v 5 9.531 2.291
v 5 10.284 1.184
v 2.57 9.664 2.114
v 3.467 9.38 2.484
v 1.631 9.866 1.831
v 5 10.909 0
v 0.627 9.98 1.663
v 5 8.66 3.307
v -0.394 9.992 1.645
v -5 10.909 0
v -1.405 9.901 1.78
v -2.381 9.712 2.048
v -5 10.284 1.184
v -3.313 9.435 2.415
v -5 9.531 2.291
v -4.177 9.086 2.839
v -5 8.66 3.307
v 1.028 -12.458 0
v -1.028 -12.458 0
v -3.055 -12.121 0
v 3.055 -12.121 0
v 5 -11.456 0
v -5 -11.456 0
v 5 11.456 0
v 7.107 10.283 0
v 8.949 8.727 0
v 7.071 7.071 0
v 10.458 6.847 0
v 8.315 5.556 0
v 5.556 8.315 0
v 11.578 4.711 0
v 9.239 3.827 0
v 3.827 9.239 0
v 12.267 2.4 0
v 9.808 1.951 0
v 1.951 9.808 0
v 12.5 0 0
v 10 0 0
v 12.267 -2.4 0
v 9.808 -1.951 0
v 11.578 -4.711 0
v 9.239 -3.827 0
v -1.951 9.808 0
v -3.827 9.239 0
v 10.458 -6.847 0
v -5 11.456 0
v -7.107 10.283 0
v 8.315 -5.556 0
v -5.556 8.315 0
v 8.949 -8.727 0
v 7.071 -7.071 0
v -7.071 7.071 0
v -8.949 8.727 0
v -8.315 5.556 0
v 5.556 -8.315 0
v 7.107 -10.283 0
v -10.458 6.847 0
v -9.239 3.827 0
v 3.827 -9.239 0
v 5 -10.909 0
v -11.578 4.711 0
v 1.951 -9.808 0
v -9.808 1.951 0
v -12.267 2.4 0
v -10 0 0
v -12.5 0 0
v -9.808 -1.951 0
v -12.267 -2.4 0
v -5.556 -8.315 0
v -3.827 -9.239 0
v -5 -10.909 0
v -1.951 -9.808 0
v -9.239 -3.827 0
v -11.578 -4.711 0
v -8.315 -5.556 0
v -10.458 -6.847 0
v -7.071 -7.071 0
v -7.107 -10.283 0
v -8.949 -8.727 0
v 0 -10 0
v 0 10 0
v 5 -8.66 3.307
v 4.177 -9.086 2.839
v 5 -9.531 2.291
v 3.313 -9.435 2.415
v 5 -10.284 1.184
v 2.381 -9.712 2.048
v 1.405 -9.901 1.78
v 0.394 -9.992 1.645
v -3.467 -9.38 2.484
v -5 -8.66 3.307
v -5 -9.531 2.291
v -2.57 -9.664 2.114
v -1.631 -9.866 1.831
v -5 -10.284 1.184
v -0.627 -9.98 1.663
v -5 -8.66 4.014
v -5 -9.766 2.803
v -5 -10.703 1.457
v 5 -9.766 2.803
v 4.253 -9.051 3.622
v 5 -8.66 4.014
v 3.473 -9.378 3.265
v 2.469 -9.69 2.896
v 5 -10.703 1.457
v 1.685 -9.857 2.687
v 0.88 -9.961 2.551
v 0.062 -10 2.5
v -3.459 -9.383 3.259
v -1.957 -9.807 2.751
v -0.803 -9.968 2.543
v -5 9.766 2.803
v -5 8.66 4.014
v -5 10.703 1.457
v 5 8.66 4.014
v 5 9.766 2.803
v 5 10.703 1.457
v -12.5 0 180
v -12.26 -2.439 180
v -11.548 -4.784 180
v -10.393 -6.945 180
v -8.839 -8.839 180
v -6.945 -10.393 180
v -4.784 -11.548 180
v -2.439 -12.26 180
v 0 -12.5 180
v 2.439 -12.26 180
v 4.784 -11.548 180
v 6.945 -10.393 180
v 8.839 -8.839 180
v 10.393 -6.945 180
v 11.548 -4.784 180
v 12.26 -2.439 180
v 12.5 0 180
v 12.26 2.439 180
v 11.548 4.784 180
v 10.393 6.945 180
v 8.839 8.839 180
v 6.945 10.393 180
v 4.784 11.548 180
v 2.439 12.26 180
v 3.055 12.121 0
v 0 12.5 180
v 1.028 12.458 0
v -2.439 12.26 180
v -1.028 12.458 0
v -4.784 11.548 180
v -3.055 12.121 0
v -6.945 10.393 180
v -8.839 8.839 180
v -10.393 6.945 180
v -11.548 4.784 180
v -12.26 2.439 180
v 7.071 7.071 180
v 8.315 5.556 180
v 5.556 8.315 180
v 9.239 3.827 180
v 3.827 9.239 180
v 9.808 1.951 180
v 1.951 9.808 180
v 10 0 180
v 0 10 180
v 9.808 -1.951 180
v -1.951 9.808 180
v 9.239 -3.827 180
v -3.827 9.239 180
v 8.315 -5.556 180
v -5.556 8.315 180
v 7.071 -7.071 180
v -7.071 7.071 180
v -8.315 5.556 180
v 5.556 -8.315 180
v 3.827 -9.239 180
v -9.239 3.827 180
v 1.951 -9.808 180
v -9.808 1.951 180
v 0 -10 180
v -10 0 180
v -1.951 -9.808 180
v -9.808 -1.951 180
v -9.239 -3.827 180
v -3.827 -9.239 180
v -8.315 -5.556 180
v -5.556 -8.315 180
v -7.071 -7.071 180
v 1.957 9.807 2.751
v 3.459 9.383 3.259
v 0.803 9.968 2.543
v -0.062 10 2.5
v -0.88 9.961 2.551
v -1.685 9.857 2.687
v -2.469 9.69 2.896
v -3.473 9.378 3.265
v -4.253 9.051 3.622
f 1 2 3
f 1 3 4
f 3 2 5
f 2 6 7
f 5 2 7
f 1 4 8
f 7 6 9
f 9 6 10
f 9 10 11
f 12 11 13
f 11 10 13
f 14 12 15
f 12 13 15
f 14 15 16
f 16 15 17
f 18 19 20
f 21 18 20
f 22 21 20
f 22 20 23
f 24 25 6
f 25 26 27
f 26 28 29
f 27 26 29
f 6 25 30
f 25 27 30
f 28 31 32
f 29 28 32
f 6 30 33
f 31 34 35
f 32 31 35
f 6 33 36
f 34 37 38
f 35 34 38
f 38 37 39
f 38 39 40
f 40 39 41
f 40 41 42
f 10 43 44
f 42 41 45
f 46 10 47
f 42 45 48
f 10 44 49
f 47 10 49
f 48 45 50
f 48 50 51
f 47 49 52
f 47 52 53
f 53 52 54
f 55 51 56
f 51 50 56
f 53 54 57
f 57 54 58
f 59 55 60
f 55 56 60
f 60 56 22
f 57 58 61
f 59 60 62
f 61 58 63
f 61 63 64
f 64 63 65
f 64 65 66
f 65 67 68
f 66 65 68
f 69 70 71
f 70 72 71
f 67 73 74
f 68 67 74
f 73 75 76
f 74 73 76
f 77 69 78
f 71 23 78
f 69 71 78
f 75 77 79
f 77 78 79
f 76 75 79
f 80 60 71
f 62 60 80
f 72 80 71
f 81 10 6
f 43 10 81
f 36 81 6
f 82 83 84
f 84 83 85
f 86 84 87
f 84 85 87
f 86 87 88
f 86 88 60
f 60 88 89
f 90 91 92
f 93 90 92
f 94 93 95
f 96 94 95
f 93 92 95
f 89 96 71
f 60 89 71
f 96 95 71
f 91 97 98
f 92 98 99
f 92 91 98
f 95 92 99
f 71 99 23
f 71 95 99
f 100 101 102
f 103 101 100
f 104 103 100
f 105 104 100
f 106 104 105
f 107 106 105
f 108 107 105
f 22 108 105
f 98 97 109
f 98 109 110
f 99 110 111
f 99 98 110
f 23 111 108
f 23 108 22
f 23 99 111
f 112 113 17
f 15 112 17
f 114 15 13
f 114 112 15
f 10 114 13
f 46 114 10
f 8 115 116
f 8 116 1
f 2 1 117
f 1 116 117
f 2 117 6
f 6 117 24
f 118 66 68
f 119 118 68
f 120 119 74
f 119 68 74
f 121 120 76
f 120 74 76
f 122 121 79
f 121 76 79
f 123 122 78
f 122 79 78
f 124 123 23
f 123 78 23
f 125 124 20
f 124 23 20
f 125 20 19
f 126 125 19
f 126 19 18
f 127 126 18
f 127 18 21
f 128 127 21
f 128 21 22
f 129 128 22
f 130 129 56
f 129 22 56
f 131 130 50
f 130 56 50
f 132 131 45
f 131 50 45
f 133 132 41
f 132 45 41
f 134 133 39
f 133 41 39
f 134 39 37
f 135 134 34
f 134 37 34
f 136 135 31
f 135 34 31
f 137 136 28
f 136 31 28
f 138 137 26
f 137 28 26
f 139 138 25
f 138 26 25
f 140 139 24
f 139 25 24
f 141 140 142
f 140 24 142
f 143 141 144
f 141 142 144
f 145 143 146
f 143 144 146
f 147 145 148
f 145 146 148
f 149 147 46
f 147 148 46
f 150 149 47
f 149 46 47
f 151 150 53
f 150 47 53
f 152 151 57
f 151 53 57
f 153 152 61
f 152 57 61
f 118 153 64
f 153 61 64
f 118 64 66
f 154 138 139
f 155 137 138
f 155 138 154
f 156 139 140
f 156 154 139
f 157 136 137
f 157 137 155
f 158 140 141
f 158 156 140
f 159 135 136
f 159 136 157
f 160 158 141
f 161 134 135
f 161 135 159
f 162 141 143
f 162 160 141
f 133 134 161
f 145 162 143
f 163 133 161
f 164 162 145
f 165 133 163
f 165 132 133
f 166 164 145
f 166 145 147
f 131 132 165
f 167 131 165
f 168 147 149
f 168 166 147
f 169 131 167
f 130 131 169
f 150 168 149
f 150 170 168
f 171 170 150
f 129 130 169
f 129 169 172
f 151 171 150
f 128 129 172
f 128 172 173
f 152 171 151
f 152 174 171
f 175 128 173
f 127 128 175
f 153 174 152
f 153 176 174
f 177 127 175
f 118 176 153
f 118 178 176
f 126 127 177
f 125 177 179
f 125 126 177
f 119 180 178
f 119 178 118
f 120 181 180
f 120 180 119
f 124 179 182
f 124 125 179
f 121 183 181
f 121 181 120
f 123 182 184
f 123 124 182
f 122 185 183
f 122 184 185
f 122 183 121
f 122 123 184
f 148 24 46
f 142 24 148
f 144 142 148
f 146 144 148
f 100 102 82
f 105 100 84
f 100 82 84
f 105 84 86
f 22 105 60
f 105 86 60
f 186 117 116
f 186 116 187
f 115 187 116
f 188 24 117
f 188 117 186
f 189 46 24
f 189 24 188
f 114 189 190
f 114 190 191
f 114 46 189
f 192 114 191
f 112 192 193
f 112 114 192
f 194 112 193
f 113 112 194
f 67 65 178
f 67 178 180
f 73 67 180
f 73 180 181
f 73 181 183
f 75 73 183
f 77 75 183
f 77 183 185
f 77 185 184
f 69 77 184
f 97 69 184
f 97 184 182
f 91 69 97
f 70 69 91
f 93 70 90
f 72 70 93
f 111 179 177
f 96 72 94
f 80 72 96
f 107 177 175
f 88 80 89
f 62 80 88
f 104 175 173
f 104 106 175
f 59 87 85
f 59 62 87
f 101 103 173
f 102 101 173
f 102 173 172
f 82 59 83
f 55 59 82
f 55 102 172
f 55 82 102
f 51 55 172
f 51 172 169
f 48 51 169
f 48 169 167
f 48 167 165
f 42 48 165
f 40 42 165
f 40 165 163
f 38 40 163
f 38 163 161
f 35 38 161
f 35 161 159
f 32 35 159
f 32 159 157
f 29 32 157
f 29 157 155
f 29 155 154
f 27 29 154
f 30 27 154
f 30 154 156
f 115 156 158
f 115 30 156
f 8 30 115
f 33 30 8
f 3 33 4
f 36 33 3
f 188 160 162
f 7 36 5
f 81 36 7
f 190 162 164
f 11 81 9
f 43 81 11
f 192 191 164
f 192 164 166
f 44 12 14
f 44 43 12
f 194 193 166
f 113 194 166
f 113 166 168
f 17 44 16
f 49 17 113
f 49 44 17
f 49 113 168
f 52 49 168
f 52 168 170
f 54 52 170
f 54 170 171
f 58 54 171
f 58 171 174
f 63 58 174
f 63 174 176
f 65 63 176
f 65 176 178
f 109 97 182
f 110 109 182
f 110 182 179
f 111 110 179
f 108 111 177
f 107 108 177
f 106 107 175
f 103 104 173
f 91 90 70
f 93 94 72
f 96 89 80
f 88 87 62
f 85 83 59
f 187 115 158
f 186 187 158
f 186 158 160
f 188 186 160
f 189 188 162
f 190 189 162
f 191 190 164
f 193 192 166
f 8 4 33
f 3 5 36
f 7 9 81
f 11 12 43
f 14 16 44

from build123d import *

# Parameters (mm, degrees)
ESBO_O1_R                  = 12.5
ESBO_O1_R_2                = 10
RESSALTO_EXTRUS_O1_DEPTH   = 180
CORTE_EXTRUS_O1_DEPTH      = 5
CORTE_EXTRUS_O1_DEPTH_BACK = 5
ESBO_O2_R                  = 12.5
ESBO_O2_R_2                = 12


with BuildPart() as part:
    # Esboço1 → Ressalto-extrusão1 (new body)
    with BuildSketch(Plane.XY):
        Circle(ESBO_O1_R)
        Circle(ESBO_O1_R_2, mode=Mode.SUBTRACT)
    extrude(amount=RESSALTO_EXTRUS_O1_DEPTH)

    # Esboço2 → Corte-extrusão1 (cut, two sides: drawn at the far end of the back side and taken through both)
    with BuildSketch(Plane(origin=(0, 0, 0), x_dir=(0, 0, -1), z_dir=(1, 0, 0)).offset(-CORTE_EXTRUS_O1_DEPTH_BACK)):
        with Locations((5, 0)):
            Circle(ESBO_O2_R)
        with Locations((5, 0)):
            Circle(ESBO_O2_R_2, mode=Mode.SUBTRACT)
    extrude(amount=CORTE_EXTRUS_O1_DEPTH + CORTE_EXTRUS_O1_DEPTH_BACK, mode=Mode.SUBTRACT)


solid = part.part
